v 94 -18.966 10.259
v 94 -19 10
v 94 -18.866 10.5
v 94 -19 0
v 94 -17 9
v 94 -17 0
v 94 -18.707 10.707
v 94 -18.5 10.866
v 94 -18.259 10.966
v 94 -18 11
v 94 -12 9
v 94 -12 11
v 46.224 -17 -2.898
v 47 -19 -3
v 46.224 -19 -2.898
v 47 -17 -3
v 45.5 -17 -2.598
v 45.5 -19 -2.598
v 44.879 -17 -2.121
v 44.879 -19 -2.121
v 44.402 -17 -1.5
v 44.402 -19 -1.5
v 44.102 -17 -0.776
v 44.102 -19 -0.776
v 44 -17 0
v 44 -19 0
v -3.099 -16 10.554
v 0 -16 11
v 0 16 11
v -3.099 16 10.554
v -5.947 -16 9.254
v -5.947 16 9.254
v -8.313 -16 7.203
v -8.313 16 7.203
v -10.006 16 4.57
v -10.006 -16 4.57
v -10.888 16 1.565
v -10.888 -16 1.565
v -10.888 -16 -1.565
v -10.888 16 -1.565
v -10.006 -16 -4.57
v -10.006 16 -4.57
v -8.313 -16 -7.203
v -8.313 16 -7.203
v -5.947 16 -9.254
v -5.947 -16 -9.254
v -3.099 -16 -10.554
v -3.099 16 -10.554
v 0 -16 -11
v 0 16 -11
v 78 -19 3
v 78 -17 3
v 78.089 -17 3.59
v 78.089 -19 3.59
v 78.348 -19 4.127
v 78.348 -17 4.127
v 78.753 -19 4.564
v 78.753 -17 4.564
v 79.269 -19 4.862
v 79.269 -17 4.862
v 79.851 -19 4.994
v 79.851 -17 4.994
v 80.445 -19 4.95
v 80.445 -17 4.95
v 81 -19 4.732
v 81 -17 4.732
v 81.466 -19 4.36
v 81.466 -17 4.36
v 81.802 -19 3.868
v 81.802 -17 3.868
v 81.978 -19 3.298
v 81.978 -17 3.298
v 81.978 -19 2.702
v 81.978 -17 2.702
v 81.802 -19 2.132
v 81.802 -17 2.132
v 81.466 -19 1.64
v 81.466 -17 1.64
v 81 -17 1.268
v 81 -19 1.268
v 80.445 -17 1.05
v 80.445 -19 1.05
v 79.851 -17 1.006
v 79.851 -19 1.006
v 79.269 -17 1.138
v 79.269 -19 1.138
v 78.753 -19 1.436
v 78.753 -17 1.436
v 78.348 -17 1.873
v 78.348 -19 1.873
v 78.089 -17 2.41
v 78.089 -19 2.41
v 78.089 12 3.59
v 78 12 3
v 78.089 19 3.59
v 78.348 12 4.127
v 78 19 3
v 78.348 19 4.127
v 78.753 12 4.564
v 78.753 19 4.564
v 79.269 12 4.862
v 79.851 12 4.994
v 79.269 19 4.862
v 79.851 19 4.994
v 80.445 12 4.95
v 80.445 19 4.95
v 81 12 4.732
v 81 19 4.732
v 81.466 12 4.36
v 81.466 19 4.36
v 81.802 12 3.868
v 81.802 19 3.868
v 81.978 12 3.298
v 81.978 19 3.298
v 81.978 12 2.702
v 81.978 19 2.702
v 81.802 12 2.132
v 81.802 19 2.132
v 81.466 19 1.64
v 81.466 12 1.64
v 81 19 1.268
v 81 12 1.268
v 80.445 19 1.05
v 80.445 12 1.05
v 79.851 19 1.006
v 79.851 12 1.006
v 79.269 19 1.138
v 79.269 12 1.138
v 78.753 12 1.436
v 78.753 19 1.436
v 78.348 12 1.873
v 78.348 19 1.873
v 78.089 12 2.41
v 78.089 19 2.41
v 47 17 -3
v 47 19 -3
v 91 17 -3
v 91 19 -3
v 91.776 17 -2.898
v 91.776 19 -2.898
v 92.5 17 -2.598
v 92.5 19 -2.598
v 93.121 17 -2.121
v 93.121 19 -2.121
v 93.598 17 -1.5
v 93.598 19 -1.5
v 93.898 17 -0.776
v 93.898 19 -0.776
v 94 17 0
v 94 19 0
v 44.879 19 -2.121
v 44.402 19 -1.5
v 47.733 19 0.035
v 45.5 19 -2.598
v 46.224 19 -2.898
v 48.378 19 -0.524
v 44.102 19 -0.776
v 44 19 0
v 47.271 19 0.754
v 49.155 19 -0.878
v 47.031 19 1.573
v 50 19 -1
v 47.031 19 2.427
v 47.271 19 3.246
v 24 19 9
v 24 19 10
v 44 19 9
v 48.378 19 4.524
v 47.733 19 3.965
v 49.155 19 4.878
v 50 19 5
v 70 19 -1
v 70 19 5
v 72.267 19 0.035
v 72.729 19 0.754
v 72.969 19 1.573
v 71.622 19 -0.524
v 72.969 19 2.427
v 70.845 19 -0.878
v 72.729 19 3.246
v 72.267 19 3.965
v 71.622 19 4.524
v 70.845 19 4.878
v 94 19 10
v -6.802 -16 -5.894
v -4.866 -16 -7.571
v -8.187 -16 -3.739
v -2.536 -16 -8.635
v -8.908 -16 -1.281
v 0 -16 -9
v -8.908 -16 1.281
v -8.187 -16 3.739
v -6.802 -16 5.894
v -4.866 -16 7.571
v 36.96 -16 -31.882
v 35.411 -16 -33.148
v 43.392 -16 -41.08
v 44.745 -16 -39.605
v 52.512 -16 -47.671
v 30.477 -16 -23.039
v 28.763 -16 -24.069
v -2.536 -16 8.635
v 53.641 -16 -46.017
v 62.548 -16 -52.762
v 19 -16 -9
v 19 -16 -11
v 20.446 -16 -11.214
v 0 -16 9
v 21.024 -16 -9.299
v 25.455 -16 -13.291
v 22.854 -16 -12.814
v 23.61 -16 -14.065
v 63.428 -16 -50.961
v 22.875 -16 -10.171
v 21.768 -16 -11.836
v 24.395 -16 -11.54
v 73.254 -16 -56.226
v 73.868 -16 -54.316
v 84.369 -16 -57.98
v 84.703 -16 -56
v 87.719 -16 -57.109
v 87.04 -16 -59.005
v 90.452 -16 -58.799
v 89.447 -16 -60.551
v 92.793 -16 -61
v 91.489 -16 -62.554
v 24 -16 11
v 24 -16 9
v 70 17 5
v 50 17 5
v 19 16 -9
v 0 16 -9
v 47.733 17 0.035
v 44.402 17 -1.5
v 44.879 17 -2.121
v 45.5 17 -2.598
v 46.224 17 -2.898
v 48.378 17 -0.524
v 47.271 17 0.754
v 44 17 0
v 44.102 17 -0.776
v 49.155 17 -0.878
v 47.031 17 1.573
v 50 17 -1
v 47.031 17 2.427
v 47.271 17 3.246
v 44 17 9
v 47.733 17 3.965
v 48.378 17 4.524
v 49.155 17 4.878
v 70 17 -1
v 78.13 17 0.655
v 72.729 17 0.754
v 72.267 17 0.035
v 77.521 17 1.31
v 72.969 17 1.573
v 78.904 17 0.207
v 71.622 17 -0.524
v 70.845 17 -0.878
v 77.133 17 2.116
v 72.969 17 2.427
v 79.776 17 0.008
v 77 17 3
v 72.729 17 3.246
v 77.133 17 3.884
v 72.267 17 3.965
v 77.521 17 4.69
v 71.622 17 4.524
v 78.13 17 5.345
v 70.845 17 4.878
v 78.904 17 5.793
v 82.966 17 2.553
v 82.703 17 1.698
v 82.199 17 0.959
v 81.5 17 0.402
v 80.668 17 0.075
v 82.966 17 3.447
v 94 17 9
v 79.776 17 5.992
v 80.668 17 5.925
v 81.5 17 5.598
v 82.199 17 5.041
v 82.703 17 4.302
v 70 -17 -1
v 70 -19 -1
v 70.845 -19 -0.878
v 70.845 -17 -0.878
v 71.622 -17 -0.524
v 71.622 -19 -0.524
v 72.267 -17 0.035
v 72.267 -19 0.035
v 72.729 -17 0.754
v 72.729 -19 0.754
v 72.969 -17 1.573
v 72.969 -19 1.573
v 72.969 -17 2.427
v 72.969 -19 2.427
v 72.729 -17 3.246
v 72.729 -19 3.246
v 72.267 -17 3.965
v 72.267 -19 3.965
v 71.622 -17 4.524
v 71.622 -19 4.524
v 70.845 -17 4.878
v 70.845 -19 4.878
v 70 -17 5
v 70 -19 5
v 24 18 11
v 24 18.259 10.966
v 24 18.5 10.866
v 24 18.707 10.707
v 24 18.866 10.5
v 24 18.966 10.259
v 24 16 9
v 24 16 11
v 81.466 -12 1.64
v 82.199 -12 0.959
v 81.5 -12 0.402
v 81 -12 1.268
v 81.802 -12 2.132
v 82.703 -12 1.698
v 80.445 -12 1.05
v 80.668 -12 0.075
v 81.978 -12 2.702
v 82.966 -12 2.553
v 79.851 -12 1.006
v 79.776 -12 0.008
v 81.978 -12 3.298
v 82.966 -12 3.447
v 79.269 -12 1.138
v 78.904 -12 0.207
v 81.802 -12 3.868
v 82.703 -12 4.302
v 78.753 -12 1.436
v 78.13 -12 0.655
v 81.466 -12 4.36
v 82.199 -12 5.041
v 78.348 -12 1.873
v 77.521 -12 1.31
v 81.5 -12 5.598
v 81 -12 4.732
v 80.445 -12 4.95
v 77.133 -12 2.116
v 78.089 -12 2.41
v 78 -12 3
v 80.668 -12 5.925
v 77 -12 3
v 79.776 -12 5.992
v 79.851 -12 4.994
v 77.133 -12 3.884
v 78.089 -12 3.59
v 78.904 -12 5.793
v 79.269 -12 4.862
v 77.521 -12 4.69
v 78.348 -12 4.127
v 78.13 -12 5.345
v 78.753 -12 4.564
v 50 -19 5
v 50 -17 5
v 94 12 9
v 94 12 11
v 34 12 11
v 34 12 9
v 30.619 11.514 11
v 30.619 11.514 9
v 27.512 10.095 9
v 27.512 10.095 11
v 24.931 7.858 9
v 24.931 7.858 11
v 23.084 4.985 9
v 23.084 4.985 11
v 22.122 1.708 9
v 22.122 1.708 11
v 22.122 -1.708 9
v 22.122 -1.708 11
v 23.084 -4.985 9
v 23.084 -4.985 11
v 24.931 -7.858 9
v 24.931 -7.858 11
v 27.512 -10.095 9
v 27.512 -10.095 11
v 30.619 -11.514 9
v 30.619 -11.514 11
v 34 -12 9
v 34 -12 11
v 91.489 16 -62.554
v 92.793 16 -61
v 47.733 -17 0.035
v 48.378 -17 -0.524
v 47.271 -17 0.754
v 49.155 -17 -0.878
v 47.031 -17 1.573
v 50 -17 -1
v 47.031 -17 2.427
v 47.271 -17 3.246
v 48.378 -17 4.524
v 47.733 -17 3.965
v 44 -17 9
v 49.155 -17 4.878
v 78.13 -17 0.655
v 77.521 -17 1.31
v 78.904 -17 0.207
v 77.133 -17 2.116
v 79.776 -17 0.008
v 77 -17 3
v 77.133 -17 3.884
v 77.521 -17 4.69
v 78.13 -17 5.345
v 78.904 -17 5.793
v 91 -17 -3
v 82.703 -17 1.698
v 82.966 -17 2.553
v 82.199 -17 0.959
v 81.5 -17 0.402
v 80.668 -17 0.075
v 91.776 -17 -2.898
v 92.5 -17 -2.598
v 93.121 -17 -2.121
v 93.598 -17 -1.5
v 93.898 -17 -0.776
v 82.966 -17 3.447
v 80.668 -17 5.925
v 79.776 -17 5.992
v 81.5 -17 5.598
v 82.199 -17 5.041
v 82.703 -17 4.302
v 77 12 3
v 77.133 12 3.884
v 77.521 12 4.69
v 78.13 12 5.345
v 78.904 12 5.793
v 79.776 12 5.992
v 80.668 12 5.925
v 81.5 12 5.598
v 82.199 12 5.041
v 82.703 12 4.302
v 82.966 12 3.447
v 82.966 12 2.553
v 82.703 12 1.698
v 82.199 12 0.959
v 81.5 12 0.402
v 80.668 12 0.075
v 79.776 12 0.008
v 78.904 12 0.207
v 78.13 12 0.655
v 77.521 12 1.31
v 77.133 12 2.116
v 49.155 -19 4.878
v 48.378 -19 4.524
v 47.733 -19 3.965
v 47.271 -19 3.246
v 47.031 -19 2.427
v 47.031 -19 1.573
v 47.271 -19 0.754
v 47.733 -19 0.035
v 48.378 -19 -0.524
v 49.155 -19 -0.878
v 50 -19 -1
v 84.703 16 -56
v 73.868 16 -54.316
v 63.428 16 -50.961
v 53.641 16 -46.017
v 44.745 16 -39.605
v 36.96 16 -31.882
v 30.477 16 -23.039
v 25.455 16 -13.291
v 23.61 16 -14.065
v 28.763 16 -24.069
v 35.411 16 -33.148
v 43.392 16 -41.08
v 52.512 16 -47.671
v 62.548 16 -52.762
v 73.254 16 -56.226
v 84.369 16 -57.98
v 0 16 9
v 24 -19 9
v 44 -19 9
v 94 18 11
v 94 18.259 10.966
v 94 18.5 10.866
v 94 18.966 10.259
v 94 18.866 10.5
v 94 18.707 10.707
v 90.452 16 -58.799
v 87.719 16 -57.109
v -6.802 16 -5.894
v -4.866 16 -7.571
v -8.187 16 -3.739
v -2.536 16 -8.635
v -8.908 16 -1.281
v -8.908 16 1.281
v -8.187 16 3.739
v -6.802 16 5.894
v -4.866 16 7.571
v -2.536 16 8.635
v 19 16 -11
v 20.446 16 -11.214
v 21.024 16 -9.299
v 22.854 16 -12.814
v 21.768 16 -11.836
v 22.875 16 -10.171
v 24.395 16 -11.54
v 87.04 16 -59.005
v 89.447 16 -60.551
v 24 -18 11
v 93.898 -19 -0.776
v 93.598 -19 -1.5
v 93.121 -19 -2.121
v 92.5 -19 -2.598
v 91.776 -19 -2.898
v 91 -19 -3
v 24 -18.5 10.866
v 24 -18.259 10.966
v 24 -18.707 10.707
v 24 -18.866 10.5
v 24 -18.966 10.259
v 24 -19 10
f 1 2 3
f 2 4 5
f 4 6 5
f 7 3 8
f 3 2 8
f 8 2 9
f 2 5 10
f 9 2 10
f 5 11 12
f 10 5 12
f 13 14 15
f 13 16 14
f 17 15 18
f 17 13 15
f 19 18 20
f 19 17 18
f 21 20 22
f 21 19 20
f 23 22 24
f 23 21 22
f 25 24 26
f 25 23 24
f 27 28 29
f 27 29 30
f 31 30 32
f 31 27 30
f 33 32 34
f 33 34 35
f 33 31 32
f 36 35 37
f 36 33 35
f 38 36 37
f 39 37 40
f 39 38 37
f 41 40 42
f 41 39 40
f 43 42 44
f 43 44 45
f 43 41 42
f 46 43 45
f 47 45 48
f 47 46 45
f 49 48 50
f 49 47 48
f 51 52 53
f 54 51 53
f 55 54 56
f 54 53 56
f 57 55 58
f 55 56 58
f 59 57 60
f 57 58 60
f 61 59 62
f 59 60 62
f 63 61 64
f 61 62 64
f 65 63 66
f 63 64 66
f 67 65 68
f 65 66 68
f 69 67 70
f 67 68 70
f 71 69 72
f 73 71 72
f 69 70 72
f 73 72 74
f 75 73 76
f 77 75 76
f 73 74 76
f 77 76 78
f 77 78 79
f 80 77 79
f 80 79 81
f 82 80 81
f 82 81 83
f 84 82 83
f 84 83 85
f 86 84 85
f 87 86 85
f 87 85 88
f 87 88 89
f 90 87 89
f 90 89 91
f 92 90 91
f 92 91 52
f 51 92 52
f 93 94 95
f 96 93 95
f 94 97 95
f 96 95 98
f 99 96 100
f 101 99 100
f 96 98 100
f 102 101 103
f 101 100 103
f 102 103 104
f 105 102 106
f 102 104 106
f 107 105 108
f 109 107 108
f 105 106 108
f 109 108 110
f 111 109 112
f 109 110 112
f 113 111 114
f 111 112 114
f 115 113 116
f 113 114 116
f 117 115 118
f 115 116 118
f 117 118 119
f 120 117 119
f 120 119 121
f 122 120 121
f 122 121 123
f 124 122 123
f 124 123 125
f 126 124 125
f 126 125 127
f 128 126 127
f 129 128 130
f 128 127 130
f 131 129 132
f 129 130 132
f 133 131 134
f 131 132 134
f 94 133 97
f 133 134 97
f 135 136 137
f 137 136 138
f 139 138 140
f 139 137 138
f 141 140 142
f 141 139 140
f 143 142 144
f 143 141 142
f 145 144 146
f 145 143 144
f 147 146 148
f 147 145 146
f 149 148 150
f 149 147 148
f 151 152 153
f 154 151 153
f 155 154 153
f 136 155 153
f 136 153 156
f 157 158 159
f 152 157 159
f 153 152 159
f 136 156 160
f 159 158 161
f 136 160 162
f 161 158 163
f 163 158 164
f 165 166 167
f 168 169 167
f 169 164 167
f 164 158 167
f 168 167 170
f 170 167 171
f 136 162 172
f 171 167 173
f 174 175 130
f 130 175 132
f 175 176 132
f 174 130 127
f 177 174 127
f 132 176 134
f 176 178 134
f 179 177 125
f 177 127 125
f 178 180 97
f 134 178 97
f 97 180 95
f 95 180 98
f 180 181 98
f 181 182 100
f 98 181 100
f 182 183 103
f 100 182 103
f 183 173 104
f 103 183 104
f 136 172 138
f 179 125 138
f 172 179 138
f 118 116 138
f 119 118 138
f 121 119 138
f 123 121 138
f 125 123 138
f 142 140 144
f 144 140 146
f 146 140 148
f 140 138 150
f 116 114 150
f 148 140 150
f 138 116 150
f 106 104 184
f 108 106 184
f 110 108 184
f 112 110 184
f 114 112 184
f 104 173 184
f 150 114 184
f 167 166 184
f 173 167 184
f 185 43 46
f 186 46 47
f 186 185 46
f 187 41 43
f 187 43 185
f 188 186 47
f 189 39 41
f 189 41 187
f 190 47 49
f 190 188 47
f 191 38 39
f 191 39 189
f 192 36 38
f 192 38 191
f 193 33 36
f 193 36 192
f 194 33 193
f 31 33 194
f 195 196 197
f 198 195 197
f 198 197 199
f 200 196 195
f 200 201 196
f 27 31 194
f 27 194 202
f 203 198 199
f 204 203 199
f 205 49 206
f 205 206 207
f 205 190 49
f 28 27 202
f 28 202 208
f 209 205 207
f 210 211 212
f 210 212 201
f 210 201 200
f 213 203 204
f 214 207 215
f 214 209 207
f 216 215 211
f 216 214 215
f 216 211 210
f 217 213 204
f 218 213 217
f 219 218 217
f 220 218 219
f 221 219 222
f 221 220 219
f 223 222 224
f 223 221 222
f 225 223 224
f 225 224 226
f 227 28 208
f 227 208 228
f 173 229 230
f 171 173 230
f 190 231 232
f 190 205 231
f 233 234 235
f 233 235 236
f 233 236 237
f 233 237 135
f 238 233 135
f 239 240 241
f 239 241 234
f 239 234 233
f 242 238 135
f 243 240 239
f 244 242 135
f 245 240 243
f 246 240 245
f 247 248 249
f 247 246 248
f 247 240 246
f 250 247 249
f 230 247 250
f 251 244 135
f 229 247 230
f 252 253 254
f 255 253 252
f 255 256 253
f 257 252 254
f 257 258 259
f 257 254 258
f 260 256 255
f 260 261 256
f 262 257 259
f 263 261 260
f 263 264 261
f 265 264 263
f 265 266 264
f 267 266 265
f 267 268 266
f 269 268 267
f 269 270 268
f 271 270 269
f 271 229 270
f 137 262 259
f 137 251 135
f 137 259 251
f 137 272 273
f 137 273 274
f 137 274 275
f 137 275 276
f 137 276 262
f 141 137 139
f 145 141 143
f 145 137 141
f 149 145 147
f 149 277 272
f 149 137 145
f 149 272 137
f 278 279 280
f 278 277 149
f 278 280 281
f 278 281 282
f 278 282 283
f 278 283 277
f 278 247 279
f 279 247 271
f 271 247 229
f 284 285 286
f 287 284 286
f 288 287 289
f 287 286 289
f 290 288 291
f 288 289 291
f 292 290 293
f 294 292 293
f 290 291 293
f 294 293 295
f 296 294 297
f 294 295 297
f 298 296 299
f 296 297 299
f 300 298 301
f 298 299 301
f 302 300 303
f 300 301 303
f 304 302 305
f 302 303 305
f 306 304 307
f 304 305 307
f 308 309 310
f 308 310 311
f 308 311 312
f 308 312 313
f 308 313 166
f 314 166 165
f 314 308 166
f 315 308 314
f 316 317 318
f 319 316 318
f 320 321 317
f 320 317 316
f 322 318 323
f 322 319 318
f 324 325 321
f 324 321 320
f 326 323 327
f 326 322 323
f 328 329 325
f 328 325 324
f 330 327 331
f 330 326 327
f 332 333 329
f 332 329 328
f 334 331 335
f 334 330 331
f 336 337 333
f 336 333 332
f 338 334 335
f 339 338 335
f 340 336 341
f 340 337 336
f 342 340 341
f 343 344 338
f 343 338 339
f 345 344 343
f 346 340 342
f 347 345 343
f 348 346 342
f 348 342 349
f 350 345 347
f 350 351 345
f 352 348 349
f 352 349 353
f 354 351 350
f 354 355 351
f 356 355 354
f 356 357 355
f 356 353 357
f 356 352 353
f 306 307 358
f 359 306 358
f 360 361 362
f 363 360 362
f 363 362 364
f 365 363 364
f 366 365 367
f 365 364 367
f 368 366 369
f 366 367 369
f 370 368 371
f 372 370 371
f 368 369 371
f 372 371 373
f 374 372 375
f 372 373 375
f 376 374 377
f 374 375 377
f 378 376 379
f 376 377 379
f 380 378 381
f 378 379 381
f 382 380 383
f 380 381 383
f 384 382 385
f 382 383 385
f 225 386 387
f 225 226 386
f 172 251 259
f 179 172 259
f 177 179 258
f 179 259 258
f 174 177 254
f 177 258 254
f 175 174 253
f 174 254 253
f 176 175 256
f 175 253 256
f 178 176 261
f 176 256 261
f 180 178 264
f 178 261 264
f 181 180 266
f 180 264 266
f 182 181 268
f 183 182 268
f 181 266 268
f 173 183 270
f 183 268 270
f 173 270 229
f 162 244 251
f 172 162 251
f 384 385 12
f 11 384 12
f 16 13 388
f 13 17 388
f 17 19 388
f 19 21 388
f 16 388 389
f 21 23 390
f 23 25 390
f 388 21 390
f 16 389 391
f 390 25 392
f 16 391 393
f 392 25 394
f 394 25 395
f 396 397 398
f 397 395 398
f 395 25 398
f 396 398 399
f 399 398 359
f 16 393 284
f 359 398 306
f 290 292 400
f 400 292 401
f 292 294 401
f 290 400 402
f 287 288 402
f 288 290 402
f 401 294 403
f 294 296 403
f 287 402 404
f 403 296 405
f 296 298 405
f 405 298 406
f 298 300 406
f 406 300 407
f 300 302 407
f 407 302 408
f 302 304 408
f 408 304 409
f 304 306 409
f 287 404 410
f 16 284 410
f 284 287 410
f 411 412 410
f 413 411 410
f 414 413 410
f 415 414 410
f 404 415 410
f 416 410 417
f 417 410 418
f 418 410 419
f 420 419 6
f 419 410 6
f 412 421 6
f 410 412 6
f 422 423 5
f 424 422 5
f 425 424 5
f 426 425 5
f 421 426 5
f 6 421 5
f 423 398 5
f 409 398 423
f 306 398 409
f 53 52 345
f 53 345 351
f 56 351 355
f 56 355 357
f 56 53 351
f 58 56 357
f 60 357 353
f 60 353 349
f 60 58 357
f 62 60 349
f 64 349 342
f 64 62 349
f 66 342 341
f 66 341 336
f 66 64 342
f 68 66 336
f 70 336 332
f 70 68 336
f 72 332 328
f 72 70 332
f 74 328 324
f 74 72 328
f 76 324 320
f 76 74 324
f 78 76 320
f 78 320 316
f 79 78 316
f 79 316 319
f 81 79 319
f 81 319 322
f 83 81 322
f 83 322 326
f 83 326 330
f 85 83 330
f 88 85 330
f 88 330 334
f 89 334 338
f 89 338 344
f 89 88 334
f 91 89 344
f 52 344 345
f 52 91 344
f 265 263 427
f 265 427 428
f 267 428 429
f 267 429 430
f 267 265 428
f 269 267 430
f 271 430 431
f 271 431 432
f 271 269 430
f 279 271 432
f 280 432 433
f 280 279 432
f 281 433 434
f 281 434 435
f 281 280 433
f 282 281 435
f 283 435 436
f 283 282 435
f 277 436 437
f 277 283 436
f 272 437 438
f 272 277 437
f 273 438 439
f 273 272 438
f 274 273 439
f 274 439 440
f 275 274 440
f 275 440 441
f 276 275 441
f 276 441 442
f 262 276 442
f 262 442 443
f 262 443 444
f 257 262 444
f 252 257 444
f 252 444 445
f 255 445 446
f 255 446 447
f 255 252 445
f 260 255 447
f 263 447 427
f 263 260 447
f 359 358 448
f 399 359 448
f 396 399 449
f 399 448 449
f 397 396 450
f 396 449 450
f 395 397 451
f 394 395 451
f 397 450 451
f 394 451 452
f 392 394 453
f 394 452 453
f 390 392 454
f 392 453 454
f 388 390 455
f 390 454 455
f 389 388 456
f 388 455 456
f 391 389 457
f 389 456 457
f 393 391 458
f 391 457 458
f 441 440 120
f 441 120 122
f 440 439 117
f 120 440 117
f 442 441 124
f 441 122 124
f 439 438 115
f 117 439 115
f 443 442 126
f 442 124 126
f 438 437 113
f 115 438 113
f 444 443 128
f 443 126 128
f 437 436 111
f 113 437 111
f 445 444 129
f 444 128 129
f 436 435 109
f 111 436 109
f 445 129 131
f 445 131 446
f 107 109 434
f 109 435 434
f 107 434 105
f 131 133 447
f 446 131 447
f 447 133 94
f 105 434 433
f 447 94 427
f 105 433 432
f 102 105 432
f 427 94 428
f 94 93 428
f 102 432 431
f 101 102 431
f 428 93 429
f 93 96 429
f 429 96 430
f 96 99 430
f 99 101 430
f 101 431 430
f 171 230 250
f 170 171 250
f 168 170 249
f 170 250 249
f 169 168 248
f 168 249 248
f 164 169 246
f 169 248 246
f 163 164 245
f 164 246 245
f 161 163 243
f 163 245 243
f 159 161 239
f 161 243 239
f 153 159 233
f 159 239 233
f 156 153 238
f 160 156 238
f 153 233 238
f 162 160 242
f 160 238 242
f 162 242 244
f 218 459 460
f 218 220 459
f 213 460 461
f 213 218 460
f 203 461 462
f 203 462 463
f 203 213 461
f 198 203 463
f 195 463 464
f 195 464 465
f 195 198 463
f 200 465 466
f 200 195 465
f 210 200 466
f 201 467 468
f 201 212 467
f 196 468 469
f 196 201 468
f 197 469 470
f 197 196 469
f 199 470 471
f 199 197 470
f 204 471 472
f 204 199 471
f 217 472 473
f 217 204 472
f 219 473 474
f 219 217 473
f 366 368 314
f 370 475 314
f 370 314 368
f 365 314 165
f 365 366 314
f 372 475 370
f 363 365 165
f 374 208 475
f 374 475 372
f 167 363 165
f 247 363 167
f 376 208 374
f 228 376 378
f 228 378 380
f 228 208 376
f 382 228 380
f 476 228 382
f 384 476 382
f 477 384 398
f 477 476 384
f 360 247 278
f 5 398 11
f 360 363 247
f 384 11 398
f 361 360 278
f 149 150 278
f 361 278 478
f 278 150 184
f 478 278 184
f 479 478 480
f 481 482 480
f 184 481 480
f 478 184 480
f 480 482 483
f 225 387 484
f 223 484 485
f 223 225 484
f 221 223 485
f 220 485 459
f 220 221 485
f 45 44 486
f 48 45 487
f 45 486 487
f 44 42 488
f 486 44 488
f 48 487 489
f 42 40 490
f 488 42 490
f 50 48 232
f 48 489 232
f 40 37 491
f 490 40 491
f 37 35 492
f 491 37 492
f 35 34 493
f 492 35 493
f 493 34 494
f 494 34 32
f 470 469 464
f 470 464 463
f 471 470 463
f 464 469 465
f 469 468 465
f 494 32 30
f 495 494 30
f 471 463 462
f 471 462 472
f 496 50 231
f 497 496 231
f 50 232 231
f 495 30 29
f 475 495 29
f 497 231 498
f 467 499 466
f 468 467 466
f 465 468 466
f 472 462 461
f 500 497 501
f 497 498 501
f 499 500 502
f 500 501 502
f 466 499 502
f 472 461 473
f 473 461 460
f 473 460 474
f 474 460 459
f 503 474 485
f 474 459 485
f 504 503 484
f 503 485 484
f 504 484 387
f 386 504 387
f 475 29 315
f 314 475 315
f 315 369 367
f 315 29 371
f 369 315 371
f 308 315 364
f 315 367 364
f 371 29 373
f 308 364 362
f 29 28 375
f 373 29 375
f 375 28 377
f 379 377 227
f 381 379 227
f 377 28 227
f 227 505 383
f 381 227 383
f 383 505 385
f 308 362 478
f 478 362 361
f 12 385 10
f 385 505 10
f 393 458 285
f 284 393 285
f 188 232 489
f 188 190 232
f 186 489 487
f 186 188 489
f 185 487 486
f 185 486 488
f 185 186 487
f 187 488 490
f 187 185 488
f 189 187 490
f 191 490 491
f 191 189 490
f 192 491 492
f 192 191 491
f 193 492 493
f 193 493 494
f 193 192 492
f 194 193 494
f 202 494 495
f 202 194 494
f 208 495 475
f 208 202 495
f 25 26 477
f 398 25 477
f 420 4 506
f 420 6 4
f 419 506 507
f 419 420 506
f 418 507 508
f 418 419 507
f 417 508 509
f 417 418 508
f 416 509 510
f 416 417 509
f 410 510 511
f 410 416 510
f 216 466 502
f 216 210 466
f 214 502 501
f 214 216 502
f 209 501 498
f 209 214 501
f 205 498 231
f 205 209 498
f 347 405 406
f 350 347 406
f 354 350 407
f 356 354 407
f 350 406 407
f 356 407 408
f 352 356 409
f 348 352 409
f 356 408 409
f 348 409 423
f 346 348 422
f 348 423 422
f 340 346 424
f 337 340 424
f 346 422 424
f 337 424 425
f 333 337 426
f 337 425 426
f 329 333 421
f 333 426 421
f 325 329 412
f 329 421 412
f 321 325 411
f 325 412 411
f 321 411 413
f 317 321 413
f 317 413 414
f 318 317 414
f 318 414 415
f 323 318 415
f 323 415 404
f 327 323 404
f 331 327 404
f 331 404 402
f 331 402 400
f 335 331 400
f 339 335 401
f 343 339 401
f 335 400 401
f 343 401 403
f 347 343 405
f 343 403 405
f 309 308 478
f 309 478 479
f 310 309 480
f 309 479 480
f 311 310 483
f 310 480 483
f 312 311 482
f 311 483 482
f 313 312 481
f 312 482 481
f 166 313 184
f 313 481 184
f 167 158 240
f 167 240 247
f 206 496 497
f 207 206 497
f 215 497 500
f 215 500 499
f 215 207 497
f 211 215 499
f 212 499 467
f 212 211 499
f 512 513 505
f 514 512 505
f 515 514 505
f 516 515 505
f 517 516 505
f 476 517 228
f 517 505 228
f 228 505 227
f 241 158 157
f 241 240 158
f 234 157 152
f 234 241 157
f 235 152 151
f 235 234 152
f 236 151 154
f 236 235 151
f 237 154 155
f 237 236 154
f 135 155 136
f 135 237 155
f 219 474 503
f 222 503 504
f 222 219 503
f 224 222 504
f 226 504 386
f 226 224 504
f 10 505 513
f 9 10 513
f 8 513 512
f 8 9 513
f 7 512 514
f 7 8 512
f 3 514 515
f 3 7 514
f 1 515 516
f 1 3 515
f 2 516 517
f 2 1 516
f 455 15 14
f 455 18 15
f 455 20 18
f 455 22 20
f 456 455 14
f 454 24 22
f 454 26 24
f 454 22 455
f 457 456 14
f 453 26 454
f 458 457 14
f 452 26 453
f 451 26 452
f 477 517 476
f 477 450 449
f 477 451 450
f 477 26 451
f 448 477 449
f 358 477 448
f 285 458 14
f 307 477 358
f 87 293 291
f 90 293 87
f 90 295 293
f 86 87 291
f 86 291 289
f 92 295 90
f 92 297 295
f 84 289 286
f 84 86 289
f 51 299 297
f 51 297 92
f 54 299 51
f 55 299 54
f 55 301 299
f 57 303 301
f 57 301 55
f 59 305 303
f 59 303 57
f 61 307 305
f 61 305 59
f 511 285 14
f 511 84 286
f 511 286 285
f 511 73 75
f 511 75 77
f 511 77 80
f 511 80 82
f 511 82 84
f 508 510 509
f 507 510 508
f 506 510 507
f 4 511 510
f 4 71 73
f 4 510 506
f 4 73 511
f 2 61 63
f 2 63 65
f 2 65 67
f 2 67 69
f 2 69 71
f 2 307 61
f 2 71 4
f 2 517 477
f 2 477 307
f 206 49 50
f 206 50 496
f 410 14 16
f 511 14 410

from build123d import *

# Parameters (mm, degrees)
F1_DEPTH  = 16
F2_W      = 70
F2_H      = 3
F3_DEPTH  = 2
F4_W      = 50
F4_H      = 12
F5_DEPTH  = 2
F6_R      = 1
F9_DEPTH  = 2
F11_DEPTH = 38.001
F13_D     = 4
F14_R     = 3
F14_R_2   = 2
F15_DEPTH = 5
F16_R     = 3


# Not quite as in the source:
# - a pattern or mirror of a feature is missing from the dataset's text; its kind, count and spacing are read off the source's solid


with BuildPart() as f1:
    # F0 (on Front) → F1 (new body)
    with BuildSketch(Plane.XZ):
        with BuildLine():
            Line((94, 11), (0, 11))
            ThreePointArc((0, 11), (-11, 0), (0, -11))
            Line((0, -11), (19, -11))
            ThreePointArc((19, -11), (21.7681124643, -11.8361612201), (23.6103896104, -14.064978646))
            ThreePointArc((23.6103896104, -14.064978646), (47.8232093534, -44.5540629158), (84.3688749643, -57.9801280344))
            ThreePointArc((84.3688749643, -57.9801280344), (88.282737688, -59.7162176184), (91.4888593469, -62.5540182408))
            Line((91.4888593469, -62.5540182408), (92.7928354795, -61))
            ThreePointArc((92.7928354795, -61), (89.1281978331, -57.8850966861), (84.7034264019, -56))
            ThreePointArc((84.7034264019, -56), (49.0672193413, -42.9854179344), (25.4545454545, -13.2909701044))
            ThreePointArc((25.4545454545, -13.2909701044), (22.87535745, -10.1706257081), (19, -9))
            Line((19, -9), (0, -9))
            ThreePointArc((0, -9), (-9, 0), (0, 9))
            Line((0, 9), (94, 9))
            Line((94, 9), (94, 11))
        make_face()
    extrude(amount=F1_DEPTH)

    # F2 (on face) → F3 (join)
    with BuildSketch(Plane.XY.offset(11)):
        with Locations((59, -17.5)):
            Rectangle(F2_W, F2_H)
    extrude(amount=-F3_DEPTH)

    # F4 (on face) → F5 (join)
    with BuildSketch(Plane.XZ.offset(19)):
        with Locations((69, 3)):
            Rectangle(F4_W, F4_H)
    extrude(amount=-F5_DEPTH)

    # F6
    f6_edges = [f1.edges().sort_by_distance(p)[0] for p in [
        (59, -19, 11),
    ]]
    fillet(f6_edges, radius=F6_R)

    # F7: F1 across plane


with BuildPart() as f1_1:
    add(f1.part)
    add(f1.part.mirror(Plane.XZ))

    # F8 (on face) → F9 (cut)
    with BuildSketch(Plane.XY.offset(11)):
        with BuildLine():
            Line((94, 12), (34, 12))
            ThreePointArc((34, 12), (22, 0), (34, -12))
            Line((34, -12), (94, -12))
            Line((94, -12), (94, 12))
        make_face()
    extrude(amount=-F9_DEPTH, mode=Mode.SUBTRACT)

    # F10 (on face) → F11 (cut, through all)
    with BuildSketch(Plane.XZ.offset(19)):
        with BuildLine():
            ThreePointArc((50, 5), (47, 2), (50, -1))
            Line((50, -1), (70, -1))
            ThreePointArc((70, -1), (73, 2), (70, 5))
            Line((70, 5), (50, 5))
        make_face()
    extrude(amount=-F11_DEPTH, mode=Mode.SUBTRACT)

    # F13 (through all)
    with Locations(Plane.XZ.offset(19)):
        with Locations((80, 3)):
            Hole(F13_D / 2)

    # F14 (on face) → F15 (join)
    with BuildSketch(Plane(origin=(0, -17, 0), x_dir=(-1, 0, 0), z_dir=(0, 1, 0))):
        with Locations((-80, 3)):
            Circle(F14_R)
        with Locations((-80, 3)):
            Circle(F14_R_2, mode=Mode.SUBTRACT)
    f15 = extrude(amount=F15_DEPTH)

    # F15_copies: F15 across plane
    add(f15.mirror(Plane.ZX))

    # F16
    f16_edges = [f1_1.edges().sort_by_distance(p)[0] for p in [
        (94, 18, -3),
        (44, 18, -3),
        (94, -18, -3),
        (44, -18, -3),
    ]]
    fillet(f16_edges, radius=F16_R)


solid = f1_1.part
